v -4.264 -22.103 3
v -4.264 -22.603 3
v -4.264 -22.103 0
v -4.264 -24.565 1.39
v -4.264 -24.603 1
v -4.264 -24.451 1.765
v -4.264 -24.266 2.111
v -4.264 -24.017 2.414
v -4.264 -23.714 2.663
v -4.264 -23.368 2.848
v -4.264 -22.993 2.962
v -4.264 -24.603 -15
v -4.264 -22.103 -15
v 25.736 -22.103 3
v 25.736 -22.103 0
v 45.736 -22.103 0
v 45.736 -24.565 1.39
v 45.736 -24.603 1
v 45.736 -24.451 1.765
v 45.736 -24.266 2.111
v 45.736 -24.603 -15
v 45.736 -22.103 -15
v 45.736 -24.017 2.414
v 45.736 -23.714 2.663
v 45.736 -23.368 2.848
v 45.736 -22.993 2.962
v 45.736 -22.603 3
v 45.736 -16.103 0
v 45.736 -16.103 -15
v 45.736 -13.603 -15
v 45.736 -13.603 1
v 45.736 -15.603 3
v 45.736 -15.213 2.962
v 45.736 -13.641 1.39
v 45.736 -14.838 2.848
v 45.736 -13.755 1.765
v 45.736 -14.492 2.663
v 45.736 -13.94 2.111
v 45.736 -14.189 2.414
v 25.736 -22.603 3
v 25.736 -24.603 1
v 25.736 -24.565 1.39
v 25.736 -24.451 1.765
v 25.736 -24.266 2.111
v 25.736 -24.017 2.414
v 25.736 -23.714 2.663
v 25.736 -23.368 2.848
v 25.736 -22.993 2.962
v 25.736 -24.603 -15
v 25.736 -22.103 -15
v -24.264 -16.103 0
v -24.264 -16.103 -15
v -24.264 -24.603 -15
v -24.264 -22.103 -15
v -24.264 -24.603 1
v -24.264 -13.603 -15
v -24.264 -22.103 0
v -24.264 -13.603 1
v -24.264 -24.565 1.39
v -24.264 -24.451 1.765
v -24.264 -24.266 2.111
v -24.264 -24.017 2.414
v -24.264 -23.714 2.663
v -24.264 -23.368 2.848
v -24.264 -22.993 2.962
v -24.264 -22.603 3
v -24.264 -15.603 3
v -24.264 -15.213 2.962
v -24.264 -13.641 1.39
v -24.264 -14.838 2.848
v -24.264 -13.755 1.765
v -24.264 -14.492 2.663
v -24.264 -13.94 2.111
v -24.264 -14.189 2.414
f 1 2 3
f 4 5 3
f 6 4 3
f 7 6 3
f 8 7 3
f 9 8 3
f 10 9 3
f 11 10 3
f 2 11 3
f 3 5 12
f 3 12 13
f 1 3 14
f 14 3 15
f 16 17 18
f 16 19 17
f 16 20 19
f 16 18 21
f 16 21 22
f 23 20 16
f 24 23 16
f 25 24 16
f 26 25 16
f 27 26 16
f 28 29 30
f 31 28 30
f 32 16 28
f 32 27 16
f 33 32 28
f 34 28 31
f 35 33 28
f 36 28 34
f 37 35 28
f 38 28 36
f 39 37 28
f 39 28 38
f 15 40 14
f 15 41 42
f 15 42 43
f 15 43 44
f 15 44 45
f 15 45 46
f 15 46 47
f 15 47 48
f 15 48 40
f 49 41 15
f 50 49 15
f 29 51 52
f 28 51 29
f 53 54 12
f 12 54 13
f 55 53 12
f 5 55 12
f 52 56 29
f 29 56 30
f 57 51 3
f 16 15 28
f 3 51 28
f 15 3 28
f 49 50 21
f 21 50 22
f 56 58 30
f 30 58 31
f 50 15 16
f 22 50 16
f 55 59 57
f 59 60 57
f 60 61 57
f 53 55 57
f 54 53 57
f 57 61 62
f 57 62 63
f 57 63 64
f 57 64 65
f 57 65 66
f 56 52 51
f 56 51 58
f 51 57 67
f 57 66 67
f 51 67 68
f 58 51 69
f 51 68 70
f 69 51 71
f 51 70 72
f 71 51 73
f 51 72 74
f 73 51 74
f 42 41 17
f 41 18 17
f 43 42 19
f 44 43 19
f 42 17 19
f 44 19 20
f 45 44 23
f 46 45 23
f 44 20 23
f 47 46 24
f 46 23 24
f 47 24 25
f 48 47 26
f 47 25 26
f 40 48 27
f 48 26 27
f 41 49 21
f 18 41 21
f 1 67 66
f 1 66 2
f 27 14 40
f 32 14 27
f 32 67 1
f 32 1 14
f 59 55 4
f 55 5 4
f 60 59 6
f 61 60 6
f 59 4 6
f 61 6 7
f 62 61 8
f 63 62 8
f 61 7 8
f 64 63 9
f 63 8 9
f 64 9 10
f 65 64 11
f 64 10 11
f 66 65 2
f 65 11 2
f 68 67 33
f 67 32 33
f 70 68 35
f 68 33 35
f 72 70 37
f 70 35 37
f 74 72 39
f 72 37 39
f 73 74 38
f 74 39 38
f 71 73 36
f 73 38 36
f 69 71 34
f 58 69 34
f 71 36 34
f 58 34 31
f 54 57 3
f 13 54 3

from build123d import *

# Parameters (mm, degrees)
F1_DEPTH = 3
F0_W     = 20
F0_H     = 2.5
F0_W_2   = 70
F2_DEPTH = 3
F3_DEPTH = 15
F4_R     = 2


with BuildPart() as f1:
    # F0 (on Top) → F1 (new body)
    with BuildSketch(Plane.XY):
        Polygon((-24.26379, -16.103005), (-24.26379, -22.103005), (-4.26379, -22.103005), (25.73621, -22.103005), (45.73621, -22.103005), (45.73621, -16.103005), align=None)
    extrude(amount=F1_DEPTH)

    # F0 (on Top) → F2 (join)
    with BuildSketch(Plane.XY):
        with Locations((-14.26379, -23.353005)):
            Rectangle(F0_W, F0_H)
        with Locations((35.73621, -23.353005)):
            Rectangle(F0_W, F0_H)
        with Locations((10.73621, -14.853005)):
            Rectangle(F0_W_2, F0_H)
    extrude(amount=F2_DEPTH)

    # F0 (on Top) → F3 (join)
    with BuildSketch(Plane.XY):
        with Locations((10.73621, -14.853005)):
            Rectangle(F0_W_2, F0_H)
        with Locations((-14.26379, -23.353005)):
            Rectangle(F0_W, F0_H)
        with Locations((35.73621, -23.353005)):
            Rectangle(F0_W, F0_H)
    extrude(amount=-F3_DEPTH)

    # F4
    f4_edges = [f1.edges().sort_by_distance(p)[0] for p in [
        (10.73621, -13.603005, 3),
        (-14.26379, -24.603005, 3),
        (35.73621, -24.603005, 3),
    ]]
    fillet(f4_edges, radius=F4_R)


solid = f1.part
